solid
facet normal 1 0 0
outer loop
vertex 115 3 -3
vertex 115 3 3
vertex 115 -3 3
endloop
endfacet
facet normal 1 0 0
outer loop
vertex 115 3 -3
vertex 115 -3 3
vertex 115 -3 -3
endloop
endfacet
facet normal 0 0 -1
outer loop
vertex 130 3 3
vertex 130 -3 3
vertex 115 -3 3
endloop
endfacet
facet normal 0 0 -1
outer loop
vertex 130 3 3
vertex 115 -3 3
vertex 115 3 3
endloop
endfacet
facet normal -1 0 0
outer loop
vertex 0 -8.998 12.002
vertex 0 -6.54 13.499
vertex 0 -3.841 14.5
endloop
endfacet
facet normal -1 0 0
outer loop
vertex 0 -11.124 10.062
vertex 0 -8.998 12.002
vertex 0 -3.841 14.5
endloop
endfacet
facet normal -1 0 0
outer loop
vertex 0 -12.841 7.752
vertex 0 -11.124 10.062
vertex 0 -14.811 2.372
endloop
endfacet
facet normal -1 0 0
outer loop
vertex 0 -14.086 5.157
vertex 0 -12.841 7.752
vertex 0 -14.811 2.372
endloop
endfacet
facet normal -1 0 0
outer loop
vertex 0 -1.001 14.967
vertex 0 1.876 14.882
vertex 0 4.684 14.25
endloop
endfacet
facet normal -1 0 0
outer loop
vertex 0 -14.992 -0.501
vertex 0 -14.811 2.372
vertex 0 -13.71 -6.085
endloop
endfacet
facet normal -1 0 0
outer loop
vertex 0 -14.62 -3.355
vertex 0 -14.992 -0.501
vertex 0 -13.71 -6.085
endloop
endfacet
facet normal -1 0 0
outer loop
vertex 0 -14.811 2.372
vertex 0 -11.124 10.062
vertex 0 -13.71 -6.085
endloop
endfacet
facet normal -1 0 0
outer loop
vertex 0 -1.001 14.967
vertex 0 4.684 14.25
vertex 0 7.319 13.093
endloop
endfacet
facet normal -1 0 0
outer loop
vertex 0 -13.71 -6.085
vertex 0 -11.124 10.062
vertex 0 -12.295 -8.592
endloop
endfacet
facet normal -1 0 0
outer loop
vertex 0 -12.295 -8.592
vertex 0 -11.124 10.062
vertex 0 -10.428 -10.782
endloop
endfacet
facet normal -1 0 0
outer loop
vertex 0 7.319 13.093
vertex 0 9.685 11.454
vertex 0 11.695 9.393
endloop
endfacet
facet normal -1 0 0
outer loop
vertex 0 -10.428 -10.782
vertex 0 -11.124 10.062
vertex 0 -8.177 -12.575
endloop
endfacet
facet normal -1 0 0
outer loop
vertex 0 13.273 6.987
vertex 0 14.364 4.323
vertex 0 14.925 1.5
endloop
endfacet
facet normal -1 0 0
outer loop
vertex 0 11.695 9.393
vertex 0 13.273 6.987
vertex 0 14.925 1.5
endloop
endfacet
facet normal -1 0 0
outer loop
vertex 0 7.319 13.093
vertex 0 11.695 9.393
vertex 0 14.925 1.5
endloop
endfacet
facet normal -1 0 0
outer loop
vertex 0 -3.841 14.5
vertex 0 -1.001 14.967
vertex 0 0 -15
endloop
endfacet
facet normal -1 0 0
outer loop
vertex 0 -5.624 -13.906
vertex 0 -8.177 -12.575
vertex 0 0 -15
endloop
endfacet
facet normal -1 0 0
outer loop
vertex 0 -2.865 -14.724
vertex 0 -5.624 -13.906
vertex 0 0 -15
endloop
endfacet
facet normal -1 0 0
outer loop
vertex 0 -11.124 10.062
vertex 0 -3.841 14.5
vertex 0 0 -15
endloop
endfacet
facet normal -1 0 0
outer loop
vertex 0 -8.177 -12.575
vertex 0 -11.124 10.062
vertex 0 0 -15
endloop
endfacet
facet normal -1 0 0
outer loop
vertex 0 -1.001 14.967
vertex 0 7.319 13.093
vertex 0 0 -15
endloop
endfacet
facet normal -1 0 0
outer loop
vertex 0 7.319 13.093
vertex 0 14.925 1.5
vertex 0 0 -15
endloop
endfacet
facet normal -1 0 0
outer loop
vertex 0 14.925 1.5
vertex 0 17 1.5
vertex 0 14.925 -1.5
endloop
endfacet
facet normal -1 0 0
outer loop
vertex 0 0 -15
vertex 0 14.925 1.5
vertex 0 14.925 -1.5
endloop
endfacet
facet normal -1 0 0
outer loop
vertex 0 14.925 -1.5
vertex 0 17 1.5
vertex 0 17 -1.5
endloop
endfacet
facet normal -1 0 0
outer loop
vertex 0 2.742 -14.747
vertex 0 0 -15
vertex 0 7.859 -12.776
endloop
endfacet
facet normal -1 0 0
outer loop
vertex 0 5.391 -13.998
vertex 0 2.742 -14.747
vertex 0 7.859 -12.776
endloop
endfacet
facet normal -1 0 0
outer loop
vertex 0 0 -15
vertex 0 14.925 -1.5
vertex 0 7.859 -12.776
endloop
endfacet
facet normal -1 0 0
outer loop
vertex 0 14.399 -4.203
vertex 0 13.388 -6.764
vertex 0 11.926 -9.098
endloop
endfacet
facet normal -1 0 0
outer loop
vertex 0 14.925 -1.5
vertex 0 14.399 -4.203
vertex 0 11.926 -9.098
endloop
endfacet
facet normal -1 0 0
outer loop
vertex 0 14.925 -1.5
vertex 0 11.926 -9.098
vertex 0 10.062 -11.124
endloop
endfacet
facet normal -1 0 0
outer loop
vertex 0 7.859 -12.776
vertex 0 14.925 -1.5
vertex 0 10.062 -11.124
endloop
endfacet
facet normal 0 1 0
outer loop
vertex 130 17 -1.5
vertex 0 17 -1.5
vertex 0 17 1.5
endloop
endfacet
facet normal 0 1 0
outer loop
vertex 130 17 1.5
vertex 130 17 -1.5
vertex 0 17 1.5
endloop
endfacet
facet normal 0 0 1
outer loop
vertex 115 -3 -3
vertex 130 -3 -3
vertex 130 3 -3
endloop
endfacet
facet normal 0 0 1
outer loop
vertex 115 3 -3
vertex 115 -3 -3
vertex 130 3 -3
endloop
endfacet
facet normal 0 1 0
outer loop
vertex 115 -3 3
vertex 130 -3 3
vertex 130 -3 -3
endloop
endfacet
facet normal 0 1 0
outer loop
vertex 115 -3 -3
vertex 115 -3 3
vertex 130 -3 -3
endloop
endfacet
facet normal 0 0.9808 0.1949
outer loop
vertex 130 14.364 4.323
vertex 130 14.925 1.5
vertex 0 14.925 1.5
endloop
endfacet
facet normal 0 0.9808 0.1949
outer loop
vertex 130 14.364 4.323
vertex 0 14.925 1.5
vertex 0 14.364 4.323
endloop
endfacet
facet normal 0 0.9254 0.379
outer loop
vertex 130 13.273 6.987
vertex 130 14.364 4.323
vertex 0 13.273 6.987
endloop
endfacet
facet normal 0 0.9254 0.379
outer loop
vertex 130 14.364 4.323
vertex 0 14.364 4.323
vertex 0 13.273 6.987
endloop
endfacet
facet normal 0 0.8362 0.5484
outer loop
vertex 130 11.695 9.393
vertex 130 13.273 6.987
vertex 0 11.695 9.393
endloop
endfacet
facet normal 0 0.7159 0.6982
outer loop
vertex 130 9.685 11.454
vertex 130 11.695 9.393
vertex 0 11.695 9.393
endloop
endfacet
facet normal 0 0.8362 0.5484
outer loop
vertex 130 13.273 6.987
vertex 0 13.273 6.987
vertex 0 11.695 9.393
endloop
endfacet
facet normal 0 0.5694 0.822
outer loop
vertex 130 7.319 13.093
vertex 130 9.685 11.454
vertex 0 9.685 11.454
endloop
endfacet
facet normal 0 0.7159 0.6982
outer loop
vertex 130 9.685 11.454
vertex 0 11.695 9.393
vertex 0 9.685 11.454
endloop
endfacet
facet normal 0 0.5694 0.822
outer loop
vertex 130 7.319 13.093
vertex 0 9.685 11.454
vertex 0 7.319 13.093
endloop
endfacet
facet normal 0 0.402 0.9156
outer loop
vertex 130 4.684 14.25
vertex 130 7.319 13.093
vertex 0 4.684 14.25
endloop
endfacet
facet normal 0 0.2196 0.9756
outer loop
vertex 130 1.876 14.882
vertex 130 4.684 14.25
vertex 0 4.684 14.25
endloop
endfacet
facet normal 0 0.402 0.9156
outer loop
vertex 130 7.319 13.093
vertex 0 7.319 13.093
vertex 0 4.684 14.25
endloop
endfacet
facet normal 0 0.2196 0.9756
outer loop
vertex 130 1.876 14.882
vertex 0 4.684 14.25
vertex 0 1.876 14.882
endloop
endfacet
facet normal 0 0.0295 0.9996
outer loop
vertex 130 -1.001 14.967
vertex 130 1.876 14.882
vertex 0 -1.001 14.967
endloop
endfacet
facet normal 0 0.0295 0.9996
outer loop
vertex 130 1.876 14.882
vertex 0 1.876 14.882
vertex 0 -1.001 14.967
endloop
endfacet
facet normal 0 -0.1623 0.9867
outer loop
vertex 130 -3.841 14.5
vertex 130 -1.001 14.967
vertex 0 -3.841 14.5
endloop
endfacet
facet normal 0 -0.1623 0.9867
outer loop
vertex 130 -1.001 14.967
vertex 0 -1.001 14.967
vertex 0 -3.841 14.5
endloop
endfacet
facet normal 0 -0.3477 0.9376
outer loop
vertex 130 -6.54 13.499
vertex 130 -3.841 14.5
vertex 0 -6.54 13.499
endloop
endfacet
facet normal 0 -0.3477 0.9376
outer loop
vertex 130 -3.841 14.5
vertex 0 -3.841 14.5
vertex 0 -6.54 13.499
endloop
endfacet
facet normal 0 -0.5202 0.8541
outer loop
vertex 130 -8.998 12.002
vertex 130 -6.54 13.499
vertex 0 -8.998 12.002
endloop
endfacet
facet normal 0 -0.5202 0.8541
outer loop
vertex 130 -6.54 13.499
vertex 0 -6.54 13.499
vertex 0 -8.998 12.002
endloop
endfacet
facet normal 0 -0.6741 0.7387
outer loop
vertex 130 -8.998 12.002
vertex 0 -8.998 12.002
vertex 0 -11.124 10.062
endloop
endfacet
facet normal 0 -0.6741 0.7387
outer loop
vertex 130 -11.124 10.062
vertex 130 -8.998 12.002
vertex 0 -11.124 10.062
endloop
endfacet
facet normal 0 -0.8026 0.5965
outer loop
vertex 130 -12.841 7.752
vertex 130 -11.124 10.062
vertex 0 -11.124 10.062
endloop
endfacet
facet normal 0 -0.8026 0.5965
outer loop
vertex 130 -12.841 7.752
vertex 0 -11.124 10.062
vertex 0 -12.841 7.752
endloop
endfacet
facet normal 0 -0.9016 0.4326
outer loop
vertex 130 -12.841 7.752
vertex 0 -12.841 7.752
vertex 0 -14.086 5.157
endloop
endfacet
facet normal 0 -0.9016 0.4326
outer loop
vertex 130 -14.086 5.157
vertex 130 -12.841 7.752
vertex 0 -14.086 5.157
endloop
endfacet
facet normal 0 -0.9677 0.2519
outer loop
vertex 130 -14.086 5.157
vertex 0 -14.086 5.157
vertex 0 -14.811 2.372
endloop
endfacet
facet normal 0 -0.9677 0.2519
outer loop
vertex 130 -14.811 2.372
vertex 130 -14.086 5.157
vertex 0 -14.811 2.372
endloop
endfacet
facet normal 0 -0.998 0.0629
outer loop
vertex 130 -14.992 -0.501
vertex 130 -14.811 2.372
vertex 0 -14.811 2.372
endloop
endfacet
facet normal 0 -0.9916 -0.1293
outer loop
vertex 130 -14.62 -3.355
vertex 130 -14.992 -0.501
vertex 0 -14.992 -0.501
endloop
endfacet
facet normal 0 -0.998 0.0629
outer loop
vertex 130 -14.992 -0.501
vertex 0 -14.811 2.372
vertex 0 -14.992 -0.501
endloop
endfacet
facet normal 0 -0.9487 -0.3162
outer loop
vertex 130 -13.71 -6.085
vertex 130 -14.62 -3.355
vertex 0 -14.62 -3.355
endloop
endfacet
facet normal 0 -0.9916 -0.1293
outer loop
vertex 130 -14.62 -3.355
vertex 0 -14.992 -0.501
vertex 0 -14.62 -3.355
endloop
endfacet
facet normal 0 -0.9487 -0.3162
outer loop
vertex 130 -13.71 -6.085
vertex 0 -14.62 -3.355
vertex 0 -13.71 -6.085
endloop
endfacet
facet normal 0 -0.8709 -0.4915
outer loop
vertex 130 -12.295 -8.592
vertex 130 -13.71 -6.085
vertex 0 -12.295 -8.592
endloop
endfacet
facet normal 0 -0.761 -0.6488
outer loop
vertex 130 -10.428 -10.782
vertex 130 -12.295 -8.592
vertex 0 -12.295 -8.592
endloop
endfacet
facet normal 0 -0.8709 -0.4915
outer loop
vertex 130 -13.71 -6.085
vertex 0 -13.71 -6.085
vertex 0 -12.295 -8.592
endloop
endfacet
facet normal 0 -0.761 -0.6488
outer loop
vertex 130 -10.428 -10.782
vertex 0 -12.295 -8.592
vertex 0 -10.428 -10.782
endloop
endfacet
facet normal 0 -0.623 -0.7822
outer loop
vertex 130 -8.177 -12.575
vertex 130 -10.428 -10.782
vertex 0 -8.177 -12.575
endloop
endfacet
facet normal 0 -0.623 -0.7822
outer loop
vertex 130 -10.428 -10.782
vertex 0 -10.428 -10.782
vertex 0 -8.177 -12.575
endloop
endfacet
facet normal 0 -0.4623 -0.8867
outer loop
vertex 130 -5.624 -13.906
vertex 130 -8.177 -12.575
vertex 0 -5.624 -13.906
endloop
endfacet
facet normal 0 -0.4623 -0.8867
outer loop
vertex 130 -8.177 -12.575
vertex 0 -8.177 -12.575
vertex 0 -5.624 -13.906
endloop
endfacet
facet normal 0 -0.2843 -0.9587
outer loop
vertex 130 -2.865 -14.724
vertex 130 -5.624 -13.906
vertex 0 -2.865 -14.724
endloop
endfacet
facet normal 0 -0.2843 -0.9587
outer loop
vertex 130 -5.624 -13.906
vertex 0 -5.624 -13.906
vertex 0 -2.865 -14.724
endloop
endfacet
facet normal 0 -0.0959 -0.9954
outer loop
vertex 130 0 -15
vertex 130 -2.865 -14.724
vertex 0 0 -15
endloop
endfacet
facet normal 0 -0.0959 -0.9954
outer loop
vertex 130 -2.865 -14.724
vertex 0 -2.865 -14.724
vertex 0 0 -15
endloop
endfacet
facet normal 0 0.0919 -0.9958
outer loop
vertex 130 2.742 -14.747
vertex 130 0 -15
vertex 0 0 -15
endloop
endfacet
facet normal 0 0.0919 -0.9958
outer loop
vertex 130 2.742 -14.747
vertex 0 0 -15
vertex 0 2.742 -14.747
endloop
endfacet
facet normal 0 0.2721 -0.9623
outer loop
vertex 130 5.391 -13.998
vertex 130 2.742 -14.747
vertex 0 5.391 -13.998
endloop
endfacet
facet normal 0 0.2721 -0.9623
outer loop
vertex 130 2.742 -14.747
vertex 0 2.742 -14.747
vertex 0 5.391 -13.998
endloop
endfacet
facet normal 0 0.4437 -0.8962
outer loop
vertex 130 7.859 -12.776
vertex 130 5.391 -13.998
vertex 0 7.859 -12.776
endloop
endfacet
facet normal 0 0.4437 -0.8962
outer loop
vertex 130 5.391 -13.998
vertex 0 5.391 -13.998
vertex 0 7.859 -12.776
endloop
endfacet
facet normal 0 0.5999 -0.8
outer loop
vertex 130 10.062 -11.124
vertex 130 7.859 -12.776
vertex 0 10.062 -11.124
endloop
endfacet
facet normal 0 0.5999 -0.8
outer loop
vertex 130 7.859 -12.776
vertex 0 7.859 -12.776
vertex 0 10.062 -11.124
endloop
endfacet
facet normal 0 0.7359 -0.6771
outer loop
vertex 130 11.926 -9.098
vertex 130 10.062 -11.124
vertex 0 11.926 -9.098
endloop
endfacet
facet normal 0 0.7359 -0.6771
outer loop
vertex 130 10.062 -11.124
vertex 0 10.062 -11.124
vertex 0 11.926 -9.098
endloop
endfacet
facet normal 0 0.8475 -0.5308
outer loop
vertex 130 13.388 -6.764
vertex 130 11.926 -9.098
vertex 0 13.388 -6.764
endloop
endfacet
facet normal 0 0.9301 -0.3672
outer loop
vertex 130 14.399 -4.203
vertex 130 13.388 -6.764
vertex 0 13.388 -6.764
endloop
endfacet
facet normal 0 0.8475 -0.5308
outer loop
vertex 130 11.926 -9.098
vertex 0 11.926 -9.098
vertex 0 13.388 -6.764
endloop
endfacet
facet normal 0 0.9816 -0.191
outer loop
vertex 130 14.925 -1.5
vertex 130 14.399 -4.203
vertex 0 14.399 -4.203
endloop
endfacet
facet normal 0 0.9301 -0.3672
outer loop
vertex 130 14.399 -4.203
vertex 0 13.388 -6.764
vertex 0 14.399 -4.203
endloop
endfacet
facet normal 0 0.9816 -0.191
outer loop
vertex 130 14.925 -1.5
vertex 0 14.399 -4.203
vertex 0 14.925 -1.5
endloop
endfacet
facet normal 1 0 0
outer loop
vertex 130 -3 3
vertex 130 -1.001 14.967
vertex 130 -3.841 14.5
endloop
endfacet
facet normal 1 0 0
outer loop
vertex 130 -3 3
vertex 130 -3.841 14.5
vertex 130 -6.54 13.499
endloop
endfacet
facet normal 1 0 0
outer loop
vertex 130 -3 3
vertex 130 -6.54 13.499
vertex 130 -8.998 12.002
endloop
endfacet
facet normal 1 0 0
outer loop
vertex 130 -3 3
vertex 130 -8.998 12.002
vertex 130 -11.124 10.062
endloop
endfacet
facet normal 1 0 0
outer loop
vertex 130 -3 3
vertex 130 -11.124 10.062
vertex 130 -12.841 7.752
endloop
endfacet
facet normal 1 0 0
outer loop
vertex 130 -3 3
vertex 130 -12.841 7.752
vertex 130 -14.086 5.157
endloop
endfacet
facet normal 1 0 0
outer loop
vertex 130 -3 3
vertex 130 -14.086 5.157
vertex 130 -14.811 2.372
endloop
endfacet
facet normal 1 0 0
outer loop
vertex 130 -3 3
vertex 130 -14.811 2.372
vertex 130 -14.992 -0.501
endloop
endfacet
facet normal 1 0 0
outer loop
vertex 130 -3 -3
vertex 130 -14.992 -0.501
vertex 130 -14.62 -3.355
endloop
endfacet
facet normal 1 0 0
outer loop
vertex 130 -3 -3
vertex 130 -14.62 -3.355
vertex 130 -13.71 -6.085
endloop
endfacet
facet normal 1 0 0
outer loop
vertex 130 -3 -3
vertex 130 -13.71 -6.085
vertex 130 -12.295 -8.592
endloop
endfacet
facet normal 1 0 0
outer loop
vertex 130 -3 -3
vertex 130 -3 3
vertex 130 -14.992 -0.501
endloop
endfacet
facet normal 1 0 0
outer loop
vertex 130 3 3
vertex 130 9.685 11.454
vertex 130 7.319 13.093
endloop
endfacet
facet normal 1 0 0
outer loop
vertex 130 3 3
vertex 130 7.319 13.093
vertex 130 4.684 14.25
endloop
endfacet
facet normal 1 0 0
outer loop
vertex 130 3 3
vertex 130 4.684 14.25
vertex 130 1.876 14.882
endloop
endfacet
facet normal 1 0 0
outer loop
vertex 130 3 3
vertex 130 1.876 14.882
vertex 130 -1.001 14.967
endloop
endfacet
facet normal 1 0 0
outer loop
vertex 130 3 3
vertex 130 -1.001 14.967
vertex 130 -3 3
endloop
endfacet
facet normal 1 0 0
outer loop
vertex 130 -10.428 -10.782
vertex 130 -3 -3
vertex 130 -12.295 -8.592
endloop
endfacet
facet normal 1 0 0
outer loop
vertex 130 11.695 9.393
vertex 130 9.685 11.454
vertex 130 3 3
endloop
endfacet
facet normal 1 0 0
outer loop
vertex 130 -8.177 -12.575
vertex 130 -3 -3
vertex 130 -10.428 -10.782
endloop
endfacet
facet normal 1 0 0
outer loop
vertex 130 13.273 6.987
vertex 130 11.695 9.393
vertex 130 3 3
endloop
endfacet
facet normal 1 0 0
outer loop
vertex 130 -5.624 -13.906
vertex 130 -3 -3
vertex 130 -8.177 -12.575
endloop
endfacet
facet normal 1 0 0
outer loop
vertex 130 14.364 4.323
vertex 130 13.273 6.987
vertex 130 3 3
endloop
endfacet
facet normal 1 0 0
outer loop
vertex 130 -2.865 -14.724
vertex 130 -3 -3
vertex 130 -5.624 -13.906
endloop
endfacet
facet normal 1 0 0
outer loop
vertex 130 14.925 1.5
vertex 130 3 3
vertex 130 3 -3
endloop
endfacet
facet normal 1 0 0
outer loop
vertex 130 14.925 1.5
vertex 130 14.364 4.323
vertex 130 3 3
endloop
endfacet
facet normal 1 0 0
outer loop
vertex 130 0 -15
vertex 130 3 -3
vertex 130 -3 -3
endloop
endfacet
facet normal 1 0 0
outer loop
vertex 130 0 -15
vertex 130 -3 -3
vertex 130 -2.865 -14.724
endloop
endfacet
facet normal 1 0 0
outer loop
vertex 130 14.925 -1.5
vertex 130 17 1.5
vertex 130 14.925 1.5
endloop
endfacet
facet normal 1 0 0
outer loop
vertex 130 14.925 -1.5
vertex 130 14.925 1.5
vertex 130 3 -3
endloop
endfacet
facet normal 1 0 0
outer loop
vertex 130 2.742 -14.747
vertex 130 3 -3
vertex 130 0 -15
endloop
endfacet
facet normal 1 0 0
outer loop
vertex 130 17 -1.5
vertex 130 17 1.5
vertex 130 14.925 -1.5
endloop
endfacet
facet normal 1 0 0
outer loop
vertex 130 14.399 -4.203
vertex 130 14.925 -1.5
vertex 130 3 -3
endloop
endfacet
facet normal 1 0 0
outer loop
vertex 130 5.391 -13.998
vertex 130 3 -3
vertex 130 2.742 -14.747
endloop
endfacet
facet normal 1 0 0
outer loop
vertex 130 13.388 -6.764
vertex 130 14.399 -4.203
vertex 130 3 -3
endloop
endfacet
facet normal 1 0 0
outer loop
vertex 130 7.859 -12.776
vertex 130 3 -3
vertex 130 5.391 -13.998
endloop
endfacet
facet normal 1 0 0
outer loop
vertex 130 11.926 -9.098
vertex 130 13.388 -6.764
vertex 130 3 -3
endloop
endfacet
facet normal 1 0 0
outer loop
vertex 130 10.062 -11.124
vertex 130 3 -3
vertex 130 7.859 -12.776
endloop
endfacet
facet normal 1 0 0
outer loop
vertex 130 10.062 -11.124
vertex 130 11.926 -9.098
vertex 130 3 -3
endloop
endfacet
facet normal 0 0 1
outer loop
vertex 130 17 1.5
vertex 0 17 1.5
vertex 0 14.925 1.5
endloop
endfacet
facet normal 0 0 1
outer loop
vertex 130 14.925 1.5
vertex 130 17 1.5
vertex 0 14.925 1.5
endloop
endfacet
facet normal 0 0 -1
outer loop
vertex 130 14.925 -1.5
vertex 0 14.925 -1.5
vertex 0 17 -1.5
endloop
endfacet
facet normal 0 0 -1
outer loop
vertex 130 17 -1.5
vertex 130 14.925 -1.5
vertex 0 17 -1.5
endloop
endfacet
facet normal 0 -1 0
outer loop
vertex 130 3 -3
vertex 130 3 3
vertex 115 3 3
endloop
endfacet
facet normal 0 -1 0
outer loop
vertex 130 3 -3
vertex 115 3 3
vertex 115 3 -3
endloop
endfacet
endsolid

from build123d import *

# Parameters (mm, degrees)
EXTRUDE_1_DEPTH     = 130
SKETCH_2_W          = 6
SKETCH_2_H          = 6
CUT_EXTRUDE_1_DEPTH = 15


with BuildPart() as part:
    # 草图1 → 凸台-拉伸1 (new body)
    with BuildSketch(Plane(origin=(0, 0, 0), x_dir=(0, 0, -1), z_dir=(1, 0, 0))):
        with BuildLine():
            Line((-1.5, 14.924811557), (-1.5, 0))
            Line((-1.5, 0), (1.5, 0))
            Line((1.5, 0), (1.5, 14.924811557))
            ThreePointArc((1.5, 14.924811557), (0, 15), (-1.5, 14.924811557))
        make_face()
        with BuildLine():
            Line((1.5, 0), (-1.5, 0))
            Line((-1.5, 0), (-1.5, 14.924811557))
            ThreePointArc((-1.5, 14.924811557), (-10.062305899, -11.124297731), (15, 0))
            ThreePointArc((15, 0), (11.124297731, 10.062305899), (1.5, 14.924811557))
            Line((1.5, 14.924811557), (1.5, 0))
        make_face()
        with BuildLine():
            Line((-1.5, 17), (-1.5, 14.924811557))
            ThreePointArc((-1.5, 14.924811557), (0, 15), (1.5, 14.924811557))
            Line((1.5, 14.924811557), (1.5, 17))
            Line((1.5, 17), (-1.5, 17))
        make_face()
    extrude(amount=EXTRUDE_1_DEPTH)

    # 草图2 → 切除-拉伸1 (cut)
    with BuildSketch(Plane(origin=(130, 0, 0), x_dir=(0, 0, -1), z_dir=(1, 0, 0))):
        Rectangle(SKETCH_2_W, SKETCH_2_H)
    extrude(amount=-CUT_EXTRUDE_1_DEPTH, mode=Mode.SUBTRACT)


solid = part.part
